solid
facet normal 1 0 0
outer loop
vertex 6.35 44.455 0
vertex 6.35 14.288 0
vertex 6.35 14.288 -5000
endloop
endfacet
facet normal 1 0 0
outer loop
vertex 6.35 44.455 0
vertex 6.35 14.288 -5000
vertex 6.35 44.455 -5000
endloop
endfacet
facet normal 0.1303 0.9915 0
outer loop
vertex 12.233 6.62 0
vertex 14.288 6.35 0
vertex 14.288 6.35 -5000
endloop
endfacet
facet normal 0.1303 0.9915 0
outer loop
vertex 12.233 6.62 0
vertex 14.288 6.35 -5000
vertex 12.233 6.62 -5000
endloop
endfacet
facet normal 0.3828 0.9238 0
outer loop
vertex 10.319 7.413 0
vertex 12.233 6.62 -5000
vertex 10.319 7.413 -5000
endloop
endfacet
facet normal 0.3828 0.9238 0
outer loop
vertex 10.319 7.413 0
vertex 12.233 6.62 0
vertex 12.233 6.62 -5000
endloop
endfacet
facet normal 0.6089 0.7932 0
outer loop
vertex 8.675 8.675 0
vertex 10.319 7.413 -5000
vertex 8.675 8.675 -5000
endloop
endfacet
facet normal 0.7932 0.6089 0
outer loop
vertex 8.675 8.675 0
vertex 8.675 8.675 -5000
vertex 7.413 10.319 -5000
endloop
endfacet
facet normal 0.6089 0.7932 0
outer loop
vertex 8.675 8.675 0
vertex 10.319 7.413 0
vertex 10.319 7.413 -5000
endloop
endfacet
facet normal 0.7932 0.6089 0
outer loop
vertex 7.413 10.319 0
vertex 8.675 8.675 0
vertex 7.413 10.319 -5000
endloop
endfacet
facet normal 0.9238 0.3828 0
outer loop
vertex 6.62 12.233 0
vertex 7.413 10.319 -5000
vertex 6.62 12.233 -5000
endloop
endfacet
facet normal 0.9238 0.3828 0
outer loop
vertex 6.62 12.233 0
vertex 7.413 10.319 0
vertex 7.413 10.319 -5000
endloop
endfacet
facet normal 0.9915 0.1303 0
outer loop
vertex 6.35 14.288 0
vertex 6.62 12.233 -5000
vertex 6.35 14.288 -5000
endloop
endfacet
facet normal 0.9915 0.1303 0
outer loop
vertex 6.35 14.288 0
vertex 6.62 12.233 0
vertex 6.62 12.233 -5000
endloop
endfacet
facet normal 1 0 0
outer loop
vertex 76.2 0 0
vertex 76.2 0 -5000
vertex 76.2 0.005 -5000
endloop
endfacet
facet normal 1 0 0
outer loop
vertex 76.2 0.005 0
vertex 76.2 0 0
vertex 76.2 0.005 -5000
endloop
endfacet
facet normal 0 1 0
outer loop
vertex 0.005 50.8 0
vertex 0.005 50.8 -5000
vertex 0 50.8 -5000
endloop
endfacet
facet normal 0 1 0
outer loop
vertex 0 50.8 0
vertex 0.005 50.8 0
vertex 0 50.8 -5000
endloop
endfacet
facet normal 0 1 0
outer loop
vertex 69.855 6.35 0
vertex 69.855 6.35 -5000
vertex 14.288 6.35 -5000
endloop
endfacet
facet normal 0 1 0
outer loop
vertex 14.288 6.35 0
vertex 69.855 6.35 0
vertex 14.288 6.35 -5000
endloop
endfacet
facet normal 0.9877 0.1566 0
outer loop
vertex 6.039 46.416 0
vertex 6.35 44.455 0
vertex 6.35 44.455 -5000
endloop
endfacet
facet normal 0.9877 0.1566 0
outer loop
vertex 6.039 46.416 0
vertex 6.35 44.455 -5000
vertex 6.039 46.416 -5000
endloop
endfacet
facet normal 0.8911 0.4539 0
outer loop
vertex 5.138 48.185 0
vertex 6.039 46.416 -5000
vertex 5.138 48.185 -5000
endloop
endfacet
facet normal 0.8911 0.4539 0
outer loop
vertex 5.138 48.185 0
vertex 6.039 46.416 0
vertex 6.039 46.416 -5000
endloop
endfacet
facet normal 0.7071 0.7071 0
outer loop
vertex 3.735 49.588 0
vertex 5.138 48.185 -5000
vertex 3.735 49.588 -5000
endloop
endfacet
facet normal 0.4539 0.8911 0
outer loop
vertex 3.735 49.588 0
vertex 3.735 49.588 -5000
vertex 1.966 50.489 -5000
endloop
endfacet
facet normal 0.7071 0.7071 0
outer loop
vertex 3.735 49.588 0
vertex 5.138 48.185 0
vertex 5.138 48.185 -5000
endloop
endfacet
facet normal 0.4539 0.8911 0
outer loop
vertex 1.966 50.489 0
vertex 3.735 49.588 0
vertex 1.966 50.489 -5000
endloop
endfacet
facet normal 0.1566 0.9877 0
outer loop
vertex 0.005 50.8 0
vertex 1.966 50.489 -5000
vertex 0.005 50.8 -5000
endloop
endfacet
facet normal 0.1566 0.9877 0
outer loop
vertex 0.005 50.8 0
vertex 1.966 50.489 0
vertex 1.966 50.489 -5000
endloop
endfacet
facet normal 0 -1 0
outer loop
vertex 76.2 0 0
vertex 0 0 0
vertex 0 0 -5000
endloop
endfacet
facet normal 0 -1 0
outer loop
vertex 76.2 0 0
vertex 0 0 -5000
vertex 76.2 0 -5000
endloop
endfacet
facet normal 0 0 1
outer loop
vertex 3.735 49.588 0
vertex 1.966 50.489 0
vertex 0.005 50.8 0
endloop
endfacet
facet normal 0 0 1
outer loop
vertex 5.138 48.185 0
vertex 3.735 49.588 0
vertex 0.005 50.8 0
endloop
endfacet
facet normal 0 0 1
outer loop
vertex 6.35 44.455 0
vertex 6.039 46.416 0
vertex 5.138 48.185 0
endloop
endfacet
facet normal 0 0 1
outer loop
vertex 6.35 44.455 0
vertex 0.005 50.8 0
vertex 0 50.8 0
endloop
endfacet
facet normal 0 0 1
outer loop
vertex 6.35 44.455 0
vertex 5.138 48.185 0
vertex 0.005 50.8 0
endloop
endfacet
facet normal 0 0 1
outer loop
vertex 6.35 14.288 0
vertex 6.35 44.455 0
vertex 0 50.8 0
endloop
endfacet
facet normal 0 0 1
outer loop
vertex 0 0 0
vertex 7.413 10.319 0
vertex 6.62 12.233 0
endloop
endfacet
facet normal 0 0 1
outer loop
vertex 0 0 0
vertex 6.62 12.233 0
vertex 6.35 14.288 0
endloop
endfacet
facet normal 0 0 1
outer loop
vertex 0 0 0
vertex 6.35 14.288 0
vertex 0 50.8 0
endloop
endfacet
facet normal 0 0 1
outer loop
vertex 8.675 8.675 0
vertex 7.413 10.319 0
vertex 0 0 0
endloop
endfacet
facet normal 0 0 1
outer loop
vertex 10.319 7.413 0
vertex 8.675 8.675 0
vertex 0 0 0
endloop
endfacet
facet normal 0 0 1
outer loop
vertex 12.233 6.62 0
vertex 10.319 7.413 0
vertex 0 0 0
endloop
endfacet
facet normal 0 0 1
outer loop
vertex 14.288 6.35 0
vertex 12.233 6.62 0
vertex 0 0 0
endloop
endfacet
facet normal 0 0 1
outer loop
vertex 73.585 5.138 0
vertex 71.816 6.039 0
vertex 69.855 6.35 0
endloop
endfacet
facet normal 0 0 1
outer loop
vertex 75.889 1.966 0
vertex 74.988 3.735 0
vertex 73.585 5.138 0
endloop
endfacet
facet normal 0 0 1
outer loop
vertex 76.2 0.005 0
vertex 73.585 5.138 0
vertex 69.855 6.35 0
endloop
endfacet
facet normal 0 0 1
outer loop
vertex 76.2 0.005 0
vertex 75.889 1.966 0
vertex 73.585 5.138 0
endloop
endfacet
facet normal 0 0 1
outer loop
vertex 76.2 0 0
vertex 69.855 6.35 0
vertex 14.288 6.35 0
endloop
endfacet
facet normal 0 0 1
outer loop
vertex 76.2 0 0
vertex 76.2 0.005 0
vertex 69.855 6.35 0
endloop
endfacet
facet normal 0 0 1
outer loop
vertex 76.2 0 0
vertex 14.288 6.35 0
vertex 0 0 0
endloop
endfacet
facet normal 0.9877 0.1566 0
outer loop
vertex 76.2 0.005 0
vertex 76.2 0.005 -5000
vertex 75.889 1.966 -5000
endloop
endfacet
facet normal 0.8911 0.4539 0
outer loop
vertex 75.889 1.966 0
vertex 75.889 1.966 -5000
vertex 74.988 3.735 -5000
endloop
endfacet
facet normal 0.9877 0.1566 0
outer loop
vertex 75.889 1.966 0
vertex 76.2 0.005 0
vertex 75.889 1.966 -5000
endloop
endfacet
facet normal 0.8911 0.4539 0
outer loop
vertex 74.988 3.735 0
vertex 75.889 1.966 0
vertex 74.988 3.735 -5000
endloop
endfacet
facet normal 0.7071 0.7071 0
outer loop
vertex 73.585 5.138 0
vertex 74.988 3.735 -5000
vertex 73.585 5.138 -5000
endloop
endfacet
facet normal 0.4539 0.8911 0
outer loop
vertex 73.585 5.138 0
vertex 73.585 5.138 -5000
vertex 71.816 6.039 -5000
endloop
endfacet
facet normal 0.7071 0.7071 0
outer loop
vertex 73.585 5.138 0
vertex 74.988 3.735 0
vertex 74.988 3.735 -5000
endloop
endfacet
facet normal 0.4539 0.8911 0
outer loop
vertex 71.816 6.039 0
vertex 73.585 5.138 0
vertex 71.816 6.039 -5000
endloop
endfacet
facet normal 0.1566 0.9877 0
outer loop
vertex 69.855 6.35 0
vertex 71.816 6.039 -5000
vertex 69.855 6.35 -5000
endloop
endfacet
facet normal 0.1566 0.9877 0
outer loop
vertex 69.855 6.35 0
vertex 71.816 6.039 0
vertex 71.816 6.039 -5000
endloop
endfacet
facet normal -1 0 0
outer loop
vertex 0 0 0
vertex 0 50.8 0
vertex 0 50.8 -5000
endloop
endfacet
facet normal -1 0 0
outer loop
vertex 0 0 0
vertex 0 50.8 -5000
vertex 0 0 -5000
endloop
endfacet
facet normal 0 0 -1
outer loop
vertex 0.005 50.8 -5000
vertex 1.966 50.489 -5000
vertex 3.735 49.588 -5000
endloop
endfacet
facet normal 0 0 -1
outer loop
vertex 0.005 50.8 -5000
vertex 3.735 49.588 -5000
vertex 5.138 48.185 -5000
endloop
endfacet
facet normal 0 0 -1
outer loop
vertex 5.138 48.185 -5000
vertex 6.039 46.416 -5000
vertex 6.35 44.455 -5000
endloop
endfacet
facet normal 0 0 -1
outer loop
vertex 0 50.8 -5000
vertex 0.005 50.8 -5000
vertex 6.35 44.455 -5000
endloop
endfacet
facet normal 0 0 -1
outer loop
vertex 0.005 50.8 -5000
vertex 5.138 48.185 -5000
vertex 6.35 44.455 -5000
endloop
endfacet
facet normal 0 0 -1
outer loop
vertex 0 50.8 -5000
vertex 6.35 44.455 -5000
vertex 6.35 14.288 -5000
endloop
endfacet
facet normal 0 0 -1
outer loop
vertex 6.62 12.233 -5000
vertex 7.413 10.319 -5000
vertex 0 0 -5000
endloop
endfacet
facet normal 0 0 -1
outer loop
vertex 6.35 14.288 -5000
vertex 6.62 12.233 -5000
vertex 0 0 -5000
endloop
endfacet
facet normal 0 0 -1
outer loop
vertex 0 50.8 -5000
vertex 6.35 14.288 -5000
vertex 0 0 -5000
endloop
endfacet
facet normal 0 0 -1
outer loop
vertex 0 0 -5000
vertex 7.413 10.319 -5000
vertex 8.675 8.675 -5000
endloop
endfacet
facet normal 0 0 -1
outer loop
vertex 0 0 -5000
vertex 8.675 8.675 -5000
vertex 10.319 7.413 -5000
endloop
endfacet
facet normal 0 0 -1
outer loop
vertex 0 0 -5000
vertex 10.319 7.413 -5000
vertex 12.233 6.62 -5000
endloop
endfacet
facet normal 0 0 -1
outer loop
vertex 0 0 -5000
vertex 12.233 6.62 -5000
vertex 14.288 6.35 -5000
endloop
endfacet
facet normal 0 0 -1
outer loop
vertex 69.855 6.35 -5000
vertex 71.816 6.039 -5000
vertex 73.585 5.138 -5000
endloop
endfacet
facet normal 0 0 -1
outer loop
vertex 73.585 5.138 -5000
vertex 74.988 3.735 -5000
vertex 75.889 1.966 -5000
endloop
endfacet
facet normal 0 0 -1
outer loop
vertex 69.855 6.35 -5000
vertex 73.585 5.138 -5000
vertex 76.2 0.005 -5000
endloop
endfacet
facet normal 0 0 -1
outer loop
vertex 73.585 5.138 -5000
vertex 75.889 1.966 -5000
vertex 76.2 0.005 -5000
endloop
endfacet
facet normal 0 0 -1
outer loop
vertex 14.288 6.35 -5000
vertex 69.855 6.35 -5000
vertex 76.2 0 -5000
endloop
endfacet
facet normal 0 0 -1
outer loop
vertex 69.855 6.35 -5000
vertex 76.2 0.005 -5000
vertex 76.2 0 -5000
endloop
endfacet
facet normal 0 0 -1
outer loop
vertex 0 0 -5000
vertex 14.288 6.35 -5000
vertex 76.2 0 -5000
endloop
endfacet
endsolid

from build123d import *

# Parameters (mm, degrees)
COMPONENTE_ESTRUTURAL1_DEPTH = 5000


with BuildPart() as part:
    # Sketch11 → Componente estrutural1 (new body)
    with BuildSketch(Plane.YX):
        with BuildLine():
            Line((0, 0), (0, 76.2))
            Line((0, 76.2), (0.00508, 76.2))
            ThreePointArc((0.00508, 76.2), (4.491615958, 74.341615958), (6.35, 69.85508))
            Line((6.35, 69.85508), (6.35, 14.2875))
            ThreePointArc((6.35, 14.2875), (8.674839924, 8.674839924), (14.2875, 6.35))
            Line((14.2875, 6.35), (44.45508, 6.35))
            ThreePointArc((44.45508, 6.35), (48.941615958, 4.491615958), (50.8, 0.00508))
            Line((50.8, 0.00508), (50.8, 0))
            Line((50.8, 0), (0, 0))
        make_face()
    extrude(amount=COMPONENTE_ESTRUTURAL1_DEPTH)


solid = part.part
